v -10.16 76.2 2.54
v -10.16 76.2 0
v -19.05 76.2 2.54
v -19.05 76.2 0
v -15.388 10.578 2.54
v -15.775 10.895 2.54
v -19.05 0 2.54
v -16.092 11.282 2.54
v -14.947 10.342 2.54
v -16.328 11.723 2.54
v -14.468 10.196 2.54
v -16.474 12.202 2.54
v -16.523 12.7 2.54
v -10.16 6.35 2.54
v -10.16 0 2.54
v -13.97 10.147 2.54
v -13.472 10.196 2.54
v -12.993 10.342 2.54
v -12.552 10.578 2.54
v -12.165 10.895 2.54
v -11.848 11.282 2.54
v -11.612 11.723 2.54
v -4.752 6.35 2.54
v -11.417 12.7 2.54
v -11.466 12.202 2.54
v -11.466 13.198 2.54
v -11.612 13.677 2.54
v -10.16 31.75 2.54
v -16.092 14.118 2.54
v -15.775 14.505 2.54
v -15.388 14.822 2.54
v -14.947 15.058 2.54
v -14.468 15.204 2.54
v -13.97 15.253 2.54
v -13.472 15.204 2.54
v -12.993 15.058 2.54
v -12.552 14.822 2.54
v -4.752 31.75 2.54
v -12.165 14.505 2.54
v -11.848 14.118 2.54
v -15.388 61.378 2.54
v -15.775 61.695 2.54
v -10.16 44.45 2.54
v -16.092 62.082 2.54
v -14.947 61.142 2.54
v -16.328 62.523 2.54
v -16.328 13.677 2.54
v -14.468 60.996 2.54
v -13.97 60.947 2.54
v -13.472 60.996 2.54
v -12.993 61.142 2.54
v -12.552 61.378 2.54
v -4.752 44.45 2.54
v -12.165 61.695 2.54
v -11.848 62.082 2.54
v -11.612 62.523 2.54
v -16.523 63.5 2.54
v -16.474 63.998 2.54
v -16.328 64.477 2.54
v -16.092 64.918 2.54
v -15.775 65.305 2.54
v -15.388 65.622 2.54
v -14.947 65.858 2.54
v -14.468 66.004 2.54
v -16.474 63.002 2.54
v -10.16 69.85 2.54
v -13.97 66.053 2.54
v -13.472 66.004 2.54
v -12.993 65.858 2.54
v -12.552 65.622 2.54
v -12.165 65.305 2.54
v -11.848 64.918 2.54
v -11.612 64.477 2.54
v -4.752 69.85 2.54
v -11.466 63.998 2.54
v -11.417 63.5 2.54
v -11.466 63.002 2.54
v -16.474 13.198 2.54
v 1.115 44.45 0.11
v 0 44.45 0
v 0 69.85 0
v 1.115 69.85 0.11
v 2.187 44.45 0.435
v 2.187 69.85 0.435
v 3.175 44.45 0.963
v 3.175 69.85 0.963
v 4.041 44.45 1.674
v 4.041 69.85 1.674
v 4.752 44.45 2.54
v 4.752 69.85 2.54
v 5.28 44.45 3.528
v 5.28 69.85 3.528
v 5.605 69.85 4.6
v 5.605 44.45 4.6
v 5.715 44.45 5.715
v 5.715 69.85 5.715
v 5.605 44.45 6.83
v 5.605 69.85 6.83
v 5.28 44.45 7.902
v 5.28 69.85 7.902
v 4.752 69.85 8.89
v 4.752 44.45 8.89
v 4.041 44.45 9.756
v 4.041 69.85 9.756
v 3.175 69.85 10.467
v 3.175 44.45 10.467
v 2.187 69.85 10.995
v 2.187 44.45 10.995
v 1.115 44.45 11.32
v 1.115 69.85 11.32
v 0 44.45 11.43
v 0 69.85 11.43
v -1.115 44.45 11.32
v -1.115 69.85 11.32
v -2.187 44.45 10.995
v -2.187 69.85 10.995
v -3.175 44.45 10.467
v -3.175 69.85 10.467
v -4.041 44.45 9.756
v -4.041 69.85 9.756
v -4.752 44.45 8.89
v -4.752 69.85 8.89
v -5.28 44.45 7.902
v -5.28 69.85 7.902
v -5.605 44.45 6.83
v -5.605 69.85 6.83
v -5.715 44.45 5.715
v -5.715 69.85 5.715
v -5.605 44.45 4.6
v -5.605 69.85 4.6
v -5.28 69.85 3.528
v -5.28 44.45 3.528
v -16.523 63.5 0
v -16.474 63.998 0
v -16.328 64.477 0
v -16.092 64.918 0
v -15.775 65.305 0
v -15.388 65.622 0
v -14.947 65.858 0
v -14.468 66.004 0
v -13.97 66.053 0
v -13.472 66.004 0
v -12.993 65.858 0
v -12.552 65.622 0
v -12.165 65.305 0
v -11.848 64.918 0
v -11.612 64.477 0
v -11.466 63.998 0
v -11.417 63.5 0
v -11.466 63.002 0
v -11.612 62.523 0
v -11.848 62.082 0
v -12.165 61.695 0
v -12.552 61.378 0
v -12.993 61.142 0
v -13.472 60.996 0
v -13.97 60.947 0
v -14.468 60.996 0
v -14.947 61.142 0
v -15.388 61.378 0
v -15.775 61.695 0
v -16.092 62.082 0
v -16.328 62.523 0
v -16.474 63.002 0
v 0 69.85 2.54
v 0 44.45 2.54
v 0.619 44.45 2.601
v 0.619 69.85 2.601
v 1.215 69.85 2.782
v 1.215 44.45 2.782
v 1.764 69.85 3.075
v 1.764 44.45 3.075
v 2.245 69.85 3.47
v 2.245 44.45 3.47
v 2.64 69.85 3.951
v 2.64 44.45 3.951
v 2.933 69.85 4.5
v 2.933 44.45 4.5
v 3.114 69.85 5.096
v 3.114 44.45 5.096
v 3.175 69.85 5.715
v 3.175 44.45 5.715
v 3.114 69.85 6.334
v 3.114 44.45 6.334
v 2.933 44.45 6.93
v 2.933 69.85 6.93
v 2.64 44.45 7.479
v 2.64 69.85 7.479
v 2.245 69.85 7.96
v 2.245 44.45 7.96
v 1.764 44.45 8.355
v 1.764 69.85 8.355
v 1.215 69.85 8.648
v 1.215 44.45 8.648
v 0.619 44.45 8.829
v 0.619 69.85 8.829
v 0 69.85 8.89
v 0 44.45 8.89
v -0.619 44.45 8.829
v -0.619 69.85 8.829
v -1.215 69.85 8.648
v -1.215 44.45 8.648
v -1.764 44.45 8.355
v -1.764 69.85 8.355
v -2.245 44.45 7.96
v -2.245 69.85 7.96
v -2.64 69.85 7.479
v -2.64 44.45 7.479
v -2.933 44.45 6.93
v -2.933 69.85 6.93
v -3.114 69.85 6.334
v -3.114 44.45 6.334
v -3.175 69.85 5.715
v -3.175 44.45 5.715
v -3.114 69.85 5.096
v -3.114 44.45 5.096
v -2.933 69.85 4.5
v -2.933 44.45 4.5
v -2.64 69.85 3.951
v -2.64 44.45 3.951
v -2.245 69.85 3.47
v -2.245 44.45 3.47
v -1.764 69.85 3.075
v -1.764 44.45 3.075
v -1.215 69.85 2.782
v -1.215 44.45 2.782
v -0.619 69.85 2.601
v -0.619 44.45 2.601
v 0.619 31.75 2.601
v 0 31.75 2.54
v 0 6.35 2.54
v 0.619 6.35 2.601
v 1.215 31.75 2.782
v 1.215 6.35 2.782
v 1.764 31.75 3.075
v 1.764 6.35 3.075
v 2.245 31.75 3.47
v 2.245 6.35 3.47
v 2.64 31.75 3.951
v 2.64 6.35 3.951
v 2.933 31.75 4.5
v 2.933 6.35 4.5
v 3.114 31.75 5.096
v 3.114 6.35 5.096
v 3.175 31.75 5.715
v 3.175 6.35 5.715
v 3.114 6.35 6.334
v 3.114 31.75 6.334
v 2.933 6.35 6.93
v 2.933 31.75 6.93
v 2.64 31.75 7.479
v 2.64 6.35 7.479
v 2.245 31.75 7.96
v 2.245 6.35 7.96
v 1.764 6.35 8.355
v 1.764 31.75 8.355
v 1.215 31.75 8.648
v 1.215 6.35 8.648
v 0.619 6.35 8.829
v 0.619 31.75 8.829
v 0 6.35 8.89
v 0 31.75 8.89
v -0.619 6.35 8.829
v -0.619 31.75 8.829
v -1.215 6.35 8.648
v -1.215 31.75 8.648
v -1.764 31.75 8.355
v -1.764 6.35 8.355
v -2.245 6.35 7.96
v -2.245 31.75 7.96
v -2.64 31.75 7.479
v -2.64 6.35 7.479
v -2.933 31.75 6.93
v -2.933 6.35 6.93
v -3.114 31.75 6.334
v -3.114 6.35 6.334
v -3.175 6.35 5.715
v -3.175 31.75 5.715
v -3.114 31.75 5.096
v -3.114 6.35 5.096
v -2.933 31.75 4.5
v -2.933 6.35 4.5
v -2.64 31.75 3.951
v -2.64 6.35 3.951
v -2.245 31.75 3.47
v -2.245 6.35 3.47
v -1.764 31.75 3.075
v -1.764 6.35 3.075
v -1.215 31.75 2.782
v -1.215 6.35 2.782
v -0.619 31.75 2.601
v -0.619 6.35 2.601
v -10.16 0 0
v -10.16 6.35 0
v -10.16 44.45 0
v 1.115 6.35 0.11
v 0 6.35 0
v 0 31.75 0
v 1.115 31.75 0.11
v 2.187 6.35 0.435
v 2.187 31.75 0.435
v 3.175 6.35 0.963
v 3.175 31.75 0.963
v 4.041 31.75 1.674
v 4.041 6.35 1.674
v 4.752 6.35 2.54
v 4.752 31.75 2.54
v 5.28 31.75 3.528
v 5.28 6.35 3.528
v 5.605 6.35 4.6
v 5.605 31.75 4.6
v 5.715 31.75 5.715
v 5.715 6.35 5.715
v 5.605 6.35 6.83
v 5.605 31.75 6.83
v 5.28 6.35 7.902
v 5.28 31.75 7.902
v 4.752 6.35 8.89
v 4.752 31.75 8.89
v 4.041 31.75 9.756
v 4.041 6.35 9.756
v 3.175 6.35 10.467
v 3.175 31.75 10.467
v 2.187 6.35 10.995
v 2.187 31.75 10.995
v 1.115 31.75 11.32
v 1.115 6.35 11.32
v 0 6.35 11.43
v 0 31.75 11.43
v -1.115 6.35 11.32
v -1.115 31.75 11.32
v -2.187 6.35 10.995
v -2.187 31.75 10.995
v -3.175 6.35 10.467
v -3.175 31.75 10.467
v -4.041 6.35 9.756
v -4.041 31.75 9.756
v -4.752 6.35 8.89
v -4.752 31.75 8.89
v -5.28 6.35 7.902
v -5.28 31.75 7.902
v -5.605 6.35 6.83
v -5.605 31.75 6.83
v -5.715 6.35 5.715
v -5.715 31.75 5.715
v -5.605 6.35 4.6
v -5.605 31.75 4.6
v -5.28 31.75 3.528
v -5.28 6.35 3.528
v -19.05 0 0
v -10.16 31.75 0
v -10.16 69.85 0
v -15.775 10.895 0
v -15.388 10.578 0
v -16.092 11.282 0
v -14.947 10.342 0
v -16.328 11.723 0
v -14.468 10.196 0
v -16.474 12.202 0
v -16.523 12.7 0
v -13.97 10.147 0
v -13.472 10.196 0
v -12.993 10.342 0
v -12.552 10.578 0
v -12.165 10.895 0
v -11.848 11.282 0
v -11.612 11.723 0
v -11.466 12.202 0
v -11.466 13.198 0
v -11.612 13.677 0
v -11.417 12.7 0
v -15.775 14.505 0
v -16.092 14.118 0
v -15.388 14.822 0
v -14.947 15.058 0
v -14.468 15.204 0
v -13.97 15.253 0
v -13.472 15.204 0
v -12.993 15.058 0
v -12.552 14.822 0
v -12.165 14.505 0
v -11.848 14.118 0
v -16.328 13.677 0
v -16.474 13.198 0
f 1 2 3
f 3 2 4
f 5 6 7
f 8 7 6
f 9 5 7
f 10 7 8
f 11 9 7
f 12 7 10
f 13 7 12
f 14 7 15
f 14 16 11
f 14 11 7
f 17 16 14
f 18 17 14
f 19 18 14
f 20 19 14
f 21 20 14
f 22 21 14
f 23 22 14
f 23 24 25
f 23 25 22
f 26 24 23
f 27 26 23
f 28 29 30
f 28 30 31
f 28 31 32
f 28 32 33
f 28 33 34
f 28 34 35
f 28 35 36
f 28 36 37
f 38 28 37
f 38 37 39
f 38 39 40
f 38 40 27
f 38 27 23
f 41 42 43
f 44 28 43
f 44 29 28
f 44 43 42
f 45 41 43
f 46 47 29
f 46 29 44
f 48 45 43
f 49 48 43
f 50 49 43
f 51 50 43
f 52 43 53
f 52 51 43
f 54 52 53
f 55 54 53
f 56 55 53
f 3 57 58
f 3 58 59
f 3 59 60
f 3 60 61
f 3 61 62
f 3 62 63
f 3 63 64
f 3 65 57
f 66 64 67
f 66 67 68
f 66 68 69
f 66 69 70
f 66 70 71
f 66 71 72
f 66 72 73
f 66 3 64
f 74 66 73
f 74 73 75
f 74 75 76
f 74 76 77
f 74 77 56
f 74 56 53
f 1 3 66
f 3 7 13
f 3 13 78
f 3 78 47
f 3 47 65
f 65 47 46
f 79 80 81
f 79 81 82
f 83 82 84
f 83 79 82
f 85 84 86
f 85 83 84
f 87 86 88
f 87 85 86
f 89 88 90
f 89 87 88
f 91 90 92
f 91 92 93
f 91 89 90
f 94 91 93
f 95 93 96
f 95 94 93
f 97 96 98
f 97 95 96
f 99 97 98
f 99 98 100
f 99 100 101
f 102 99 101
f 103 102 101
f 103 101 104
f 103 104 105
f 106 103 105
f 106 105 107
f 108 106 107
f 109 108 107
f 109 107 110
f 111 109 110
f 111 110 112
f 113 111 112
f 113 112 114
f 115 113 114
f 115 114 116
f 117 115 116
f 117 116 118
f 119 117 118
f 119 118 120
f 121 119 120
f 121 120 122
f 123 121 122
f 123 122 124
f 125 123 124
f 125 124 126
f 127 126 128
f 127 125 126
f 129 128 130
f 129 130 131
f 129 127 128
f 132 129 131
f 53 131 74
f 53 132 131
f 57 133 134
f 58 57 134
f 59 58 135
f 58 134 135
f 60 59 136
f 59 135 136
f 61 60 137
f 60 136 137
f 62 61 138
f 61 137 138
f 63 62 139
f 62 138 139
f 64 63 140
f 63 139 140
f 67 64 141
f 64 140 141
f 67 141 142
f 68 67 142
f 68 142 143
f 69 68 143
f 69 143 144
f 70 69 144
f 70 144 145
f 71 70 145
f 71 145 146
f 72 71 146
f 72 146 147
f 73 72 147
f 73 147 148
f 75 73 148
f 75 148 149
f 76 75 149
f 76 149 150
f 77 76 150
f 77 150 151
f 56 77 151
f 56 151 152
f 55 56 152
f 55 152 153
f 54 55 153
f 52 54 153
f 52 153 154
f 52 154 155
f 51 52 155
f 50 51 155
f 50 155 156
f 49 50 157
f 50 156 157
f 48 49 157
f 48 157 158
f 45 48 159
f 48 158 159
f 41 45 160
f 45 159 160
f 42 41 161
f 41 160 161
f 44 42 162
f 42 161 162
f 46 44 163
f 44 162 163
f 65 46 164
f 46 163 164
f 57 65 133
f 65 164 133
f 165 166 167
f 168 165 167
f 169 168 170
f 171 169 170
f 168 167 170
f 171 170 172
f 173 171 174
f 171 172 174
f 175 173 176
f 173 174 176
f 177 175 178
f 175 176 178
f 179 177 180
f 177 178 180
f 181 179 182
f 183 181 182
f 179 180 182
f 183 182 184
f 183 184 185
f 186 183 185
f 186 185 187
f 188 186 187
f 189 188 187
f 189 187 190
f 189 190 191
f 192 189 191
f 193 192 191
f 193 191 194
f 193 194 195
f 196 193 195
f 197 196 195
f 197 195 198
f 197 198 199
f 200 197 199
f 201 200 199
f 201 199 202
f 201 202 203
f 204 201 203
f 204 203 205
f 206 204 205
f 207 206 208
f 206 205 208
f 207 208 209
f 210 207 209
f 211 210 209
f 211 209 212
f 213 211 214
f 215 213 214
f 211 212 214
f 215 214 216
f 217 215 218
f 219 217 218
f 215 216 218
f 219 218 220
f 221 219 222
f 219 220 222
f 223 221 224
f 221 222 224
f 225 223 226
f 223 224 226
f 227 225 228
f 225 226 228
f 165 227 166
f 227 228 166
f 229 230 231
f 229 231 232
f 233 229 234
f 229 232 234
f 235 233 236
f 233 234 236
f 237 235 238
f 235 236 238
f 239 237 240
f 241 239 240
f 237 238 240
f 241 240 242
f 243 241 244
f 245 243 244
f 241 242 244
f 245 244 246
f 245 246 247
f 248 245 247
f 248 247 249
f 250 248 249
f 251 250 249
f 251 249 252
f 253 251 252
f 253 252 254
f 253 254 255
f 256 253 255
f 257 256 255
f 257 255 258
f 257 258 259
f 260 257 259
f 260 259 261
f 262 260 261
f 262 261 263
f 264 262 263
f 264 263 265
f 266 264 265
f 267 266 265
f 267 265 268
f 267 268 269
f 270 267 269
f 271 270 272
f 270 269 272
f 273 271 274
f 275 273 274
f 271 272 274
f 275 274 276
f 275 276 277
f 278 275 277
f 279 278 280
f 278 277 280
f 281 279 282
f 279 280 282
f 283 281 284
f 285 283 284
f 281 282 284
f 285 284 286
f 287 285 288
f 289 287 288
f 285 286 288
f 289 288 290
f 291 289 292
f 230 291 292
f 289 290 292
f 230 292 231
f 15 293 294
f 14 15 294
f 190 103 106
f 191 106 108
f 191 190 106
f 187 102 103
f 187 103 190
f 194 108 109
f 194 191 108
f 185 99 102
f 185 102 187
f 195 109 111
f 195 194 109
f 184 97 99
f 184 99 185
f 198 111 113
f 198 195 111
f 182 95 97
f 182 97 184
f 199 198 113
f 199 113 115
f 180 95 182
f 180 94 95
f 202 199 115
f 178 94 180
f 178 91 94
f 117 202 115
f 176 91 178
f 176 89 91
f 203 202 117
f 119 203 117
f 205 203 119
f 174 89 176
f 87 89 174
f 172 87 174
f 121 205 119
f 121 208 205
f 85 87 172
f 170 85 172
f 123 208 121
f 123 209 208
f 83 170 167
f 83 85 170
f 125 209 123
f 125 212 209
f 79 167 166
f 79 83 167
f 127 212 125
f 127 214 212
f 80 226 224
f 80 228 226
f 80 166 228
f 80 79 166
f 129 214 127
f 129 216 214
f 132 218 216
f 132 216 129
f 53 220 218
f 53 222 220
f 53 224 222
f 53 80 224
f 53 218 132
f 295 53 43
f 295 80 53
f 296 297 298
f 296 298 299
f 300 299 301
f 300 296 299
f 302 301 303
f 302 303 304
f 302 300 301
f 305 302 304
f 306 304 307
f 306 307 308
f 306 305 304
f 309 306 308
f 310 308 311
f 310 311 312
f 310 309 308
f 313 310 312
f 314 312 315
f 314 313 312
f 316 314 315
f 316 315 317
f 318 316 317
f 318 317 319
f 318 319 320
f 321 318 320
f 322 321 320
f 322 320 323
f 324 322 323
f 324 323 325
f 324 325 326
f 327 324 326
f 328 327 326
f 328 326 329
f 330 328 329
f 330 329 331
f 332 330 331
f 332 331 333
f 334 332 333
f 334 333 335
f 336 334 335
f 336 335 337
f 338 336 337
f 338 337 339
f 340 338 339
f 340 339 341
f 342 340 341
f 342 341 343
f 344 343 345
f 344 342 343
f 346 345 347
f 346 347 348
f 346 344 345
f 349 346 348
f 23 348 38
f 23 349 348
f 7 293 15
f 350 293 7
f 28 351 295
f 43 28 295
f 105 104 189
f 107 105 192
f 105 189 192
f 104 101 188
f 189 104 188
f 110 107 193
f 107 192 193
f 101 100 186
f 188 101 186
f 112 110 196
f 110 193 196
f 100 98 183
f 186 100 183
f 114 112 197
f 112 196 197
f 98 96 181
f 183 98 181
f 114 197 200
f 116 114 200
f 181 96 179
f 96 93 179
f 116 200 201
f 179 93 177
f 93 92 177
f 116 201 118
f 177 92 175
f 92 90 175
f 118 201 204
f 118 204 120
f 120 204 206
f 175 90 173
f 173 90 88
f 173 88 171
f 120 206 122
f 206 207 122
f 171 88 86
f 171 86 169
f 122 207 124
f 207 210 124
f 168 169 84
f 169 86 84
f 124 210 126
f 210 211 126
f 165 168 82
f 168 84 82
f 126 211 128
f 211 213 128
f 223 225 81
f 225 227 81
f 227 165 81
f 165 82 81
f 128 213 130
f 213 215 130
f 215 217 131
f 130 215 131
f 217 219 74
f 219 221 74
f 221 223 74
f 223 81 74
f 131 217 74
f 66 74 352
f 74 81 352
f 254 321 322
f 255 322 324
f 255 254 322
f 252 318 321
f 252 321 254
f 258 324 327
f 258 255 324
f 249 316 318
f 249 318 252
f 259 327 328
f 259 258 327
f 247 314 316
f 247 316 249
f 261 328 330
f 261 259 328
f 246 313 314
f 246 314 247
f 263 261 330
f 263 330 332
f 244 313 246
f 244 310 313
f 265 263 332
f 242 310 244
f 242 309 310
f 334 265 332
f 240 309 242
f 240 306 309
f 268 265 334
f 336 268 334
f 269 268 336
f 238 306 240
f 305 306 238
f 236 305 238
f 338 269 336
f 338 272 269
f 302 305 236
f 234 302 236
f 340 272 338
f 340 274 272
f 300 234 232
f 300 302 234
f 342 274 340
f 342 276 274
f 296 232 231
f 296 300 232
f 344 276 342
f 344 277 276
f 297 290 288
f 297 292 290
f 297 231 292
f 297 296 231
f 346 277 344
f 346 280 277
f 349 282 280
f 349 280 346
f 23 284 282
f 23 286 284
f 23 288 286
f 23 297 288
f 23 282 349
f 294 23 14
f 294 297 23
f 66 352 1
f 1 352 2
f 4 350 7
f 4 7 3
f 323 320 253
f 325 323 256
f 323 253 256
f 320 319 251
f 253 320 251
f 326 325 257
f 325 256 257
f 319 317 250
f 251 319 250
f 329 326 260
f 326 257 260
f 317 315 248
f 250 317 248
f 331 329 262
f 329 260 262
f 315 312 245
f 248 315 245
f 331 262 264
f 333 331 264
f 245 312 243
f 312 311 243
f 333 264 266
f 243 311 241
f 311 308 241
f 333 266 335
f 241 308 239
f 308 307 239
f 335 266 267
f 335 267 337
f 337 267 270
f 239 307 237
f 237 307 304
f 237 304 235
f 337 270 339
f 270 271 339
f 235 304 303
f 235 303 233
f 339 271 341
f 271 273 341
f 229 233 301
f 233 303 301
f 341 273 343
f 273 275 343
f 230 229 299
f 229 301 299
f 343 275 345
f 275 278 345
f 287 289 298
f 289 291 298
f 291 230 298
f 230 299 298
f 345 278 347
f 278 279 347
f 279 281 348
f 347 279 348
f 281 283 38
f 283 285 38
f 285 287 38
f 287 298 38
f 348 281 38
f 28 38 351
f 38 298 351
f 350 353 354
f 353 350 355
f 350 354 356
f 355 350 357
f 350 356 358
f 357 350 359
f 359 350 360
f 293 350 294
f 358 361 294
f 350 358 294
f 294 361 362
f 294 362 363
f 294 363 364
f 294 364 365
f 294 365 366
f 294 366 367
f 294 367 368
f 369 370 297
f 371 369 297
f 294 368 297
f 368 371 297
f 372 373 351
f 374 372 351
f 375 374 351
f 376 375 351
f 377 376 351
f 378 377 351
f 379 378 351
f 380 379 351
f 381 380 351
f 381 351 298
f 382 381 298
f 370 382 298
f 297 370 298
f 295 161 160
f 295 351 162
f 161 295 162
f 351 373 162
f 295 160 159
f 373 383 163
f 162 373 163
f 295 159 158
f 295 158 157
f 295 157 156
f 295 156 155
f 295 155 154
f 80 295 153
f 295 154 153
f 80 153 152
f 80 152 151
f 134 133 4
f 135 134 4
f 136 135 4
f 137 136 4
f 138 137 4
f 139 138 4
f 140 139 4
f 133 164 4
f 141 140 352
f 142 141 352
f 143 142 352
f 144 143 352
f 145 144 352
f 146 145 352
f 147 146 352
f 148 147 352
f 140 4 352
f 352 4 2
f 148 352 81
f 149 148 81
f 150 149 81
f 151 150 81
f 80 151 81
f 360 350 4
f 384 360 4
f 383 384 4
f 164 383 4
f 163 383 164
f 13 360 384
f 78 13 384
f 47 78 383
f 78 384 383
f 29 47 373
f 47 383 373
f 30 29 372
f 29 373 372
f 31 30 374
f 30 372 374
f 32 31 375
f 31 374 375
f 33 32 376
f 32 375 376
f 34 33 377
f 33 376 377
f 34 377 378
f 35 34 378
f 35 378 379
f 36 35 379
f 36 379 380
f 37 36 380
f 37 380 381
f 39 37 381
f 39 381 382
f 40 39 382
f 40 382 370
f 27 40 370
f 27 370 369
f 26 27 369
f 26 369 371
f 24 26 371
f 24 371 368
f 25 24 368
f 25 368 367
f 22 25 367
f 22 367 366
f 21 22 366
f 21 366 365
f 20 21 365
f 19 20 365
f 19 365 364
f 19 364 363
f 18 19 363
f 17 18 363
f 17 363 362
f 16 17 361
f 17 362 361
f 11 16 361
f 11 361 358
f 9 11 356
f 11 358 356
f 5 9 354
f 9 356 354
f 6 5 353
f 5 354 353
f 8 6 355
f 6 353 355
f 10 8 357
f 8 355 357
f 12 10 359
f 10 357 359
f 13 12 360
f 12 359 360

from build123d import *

# Parameters (mm, degrees)
SKETCH1_W              = 19.05
SKETCH1_H              = 76.2
BOSS_EXTRUDE1_DEPTH    = 2.54
SKETCH2_R              = 5.715
SKETCH2_R_2            = 3.175
BOSS_EXTRUDE2_DEPTH    = 76.2
SKETCH3_W              = 25.4
SKETCH3_H              = 6.35
SKETCH3_H_2            = 12.7
CUT_EXTRUDE1_DEPTH     = 80.372459959
F_10_CLEARANCE_HOLE1_D = 5.1054


with BuildPart() as part:
    # Sketch1 → Boss-Extrude1 (new body)
    with BuildSketch(Plane.XY):
        with Locations((-9.525, 38.1)):
            Rectangle(SKETCH1_W, SKETCH1_H)
    extrude(amount=BOSS_EXTRUDE1_DEPTH)

    # Sketch2 → Boss-Extrude2 (add)
    with BuildSketch(Plane(origin=(0, 0, 0), x_dir=(-1, 0, 0), z_dir=(0, -1, 0))):
        with Locations((0, -5.715)):
            Circle(SKETCH2_R)
        with Locations(Location((0, -5.715, 0), (0, 0, 90))):
            Circle(SKETCH2_R_2, mode=Mode.SUBTRACT)
    extrude(amount=-BOSS_EXTRUDE2_DEPTH)

    # Sketch3 → Cut-Extrude1 (cut, through all)
    with BuildSketch(Plane(origin=(0, 0, 0), x_dir=(-1, 0, 0), z_dir=(0, 0, -1))):
        with Locations((-2.54, 3.175)):
            Rectangle(SKETCH3_W, SKETCH3_H)
        with Locations((-2.54, 73.025)):
            Rectangle(SKETCH3_W, SKETCH3_H)
        with Locations((-2.54, 38.1)):
            Rectangle(SKETCH3_W, SKETCH3_H_2)
    extrude(amount=-CUT_EXTRUDE1_DEPTH, mode=Mode.SUBTRACT)

    # #10 Clearance Hole1 (through all)
    with Locations(Plane.XY.offset(2.54)):
        with Locations((-13.97, 63.5), (-13.97, 12.7)):
            Hole(F_10_CLEARANCE_HOLE1_D / 2)


solid = part.part
